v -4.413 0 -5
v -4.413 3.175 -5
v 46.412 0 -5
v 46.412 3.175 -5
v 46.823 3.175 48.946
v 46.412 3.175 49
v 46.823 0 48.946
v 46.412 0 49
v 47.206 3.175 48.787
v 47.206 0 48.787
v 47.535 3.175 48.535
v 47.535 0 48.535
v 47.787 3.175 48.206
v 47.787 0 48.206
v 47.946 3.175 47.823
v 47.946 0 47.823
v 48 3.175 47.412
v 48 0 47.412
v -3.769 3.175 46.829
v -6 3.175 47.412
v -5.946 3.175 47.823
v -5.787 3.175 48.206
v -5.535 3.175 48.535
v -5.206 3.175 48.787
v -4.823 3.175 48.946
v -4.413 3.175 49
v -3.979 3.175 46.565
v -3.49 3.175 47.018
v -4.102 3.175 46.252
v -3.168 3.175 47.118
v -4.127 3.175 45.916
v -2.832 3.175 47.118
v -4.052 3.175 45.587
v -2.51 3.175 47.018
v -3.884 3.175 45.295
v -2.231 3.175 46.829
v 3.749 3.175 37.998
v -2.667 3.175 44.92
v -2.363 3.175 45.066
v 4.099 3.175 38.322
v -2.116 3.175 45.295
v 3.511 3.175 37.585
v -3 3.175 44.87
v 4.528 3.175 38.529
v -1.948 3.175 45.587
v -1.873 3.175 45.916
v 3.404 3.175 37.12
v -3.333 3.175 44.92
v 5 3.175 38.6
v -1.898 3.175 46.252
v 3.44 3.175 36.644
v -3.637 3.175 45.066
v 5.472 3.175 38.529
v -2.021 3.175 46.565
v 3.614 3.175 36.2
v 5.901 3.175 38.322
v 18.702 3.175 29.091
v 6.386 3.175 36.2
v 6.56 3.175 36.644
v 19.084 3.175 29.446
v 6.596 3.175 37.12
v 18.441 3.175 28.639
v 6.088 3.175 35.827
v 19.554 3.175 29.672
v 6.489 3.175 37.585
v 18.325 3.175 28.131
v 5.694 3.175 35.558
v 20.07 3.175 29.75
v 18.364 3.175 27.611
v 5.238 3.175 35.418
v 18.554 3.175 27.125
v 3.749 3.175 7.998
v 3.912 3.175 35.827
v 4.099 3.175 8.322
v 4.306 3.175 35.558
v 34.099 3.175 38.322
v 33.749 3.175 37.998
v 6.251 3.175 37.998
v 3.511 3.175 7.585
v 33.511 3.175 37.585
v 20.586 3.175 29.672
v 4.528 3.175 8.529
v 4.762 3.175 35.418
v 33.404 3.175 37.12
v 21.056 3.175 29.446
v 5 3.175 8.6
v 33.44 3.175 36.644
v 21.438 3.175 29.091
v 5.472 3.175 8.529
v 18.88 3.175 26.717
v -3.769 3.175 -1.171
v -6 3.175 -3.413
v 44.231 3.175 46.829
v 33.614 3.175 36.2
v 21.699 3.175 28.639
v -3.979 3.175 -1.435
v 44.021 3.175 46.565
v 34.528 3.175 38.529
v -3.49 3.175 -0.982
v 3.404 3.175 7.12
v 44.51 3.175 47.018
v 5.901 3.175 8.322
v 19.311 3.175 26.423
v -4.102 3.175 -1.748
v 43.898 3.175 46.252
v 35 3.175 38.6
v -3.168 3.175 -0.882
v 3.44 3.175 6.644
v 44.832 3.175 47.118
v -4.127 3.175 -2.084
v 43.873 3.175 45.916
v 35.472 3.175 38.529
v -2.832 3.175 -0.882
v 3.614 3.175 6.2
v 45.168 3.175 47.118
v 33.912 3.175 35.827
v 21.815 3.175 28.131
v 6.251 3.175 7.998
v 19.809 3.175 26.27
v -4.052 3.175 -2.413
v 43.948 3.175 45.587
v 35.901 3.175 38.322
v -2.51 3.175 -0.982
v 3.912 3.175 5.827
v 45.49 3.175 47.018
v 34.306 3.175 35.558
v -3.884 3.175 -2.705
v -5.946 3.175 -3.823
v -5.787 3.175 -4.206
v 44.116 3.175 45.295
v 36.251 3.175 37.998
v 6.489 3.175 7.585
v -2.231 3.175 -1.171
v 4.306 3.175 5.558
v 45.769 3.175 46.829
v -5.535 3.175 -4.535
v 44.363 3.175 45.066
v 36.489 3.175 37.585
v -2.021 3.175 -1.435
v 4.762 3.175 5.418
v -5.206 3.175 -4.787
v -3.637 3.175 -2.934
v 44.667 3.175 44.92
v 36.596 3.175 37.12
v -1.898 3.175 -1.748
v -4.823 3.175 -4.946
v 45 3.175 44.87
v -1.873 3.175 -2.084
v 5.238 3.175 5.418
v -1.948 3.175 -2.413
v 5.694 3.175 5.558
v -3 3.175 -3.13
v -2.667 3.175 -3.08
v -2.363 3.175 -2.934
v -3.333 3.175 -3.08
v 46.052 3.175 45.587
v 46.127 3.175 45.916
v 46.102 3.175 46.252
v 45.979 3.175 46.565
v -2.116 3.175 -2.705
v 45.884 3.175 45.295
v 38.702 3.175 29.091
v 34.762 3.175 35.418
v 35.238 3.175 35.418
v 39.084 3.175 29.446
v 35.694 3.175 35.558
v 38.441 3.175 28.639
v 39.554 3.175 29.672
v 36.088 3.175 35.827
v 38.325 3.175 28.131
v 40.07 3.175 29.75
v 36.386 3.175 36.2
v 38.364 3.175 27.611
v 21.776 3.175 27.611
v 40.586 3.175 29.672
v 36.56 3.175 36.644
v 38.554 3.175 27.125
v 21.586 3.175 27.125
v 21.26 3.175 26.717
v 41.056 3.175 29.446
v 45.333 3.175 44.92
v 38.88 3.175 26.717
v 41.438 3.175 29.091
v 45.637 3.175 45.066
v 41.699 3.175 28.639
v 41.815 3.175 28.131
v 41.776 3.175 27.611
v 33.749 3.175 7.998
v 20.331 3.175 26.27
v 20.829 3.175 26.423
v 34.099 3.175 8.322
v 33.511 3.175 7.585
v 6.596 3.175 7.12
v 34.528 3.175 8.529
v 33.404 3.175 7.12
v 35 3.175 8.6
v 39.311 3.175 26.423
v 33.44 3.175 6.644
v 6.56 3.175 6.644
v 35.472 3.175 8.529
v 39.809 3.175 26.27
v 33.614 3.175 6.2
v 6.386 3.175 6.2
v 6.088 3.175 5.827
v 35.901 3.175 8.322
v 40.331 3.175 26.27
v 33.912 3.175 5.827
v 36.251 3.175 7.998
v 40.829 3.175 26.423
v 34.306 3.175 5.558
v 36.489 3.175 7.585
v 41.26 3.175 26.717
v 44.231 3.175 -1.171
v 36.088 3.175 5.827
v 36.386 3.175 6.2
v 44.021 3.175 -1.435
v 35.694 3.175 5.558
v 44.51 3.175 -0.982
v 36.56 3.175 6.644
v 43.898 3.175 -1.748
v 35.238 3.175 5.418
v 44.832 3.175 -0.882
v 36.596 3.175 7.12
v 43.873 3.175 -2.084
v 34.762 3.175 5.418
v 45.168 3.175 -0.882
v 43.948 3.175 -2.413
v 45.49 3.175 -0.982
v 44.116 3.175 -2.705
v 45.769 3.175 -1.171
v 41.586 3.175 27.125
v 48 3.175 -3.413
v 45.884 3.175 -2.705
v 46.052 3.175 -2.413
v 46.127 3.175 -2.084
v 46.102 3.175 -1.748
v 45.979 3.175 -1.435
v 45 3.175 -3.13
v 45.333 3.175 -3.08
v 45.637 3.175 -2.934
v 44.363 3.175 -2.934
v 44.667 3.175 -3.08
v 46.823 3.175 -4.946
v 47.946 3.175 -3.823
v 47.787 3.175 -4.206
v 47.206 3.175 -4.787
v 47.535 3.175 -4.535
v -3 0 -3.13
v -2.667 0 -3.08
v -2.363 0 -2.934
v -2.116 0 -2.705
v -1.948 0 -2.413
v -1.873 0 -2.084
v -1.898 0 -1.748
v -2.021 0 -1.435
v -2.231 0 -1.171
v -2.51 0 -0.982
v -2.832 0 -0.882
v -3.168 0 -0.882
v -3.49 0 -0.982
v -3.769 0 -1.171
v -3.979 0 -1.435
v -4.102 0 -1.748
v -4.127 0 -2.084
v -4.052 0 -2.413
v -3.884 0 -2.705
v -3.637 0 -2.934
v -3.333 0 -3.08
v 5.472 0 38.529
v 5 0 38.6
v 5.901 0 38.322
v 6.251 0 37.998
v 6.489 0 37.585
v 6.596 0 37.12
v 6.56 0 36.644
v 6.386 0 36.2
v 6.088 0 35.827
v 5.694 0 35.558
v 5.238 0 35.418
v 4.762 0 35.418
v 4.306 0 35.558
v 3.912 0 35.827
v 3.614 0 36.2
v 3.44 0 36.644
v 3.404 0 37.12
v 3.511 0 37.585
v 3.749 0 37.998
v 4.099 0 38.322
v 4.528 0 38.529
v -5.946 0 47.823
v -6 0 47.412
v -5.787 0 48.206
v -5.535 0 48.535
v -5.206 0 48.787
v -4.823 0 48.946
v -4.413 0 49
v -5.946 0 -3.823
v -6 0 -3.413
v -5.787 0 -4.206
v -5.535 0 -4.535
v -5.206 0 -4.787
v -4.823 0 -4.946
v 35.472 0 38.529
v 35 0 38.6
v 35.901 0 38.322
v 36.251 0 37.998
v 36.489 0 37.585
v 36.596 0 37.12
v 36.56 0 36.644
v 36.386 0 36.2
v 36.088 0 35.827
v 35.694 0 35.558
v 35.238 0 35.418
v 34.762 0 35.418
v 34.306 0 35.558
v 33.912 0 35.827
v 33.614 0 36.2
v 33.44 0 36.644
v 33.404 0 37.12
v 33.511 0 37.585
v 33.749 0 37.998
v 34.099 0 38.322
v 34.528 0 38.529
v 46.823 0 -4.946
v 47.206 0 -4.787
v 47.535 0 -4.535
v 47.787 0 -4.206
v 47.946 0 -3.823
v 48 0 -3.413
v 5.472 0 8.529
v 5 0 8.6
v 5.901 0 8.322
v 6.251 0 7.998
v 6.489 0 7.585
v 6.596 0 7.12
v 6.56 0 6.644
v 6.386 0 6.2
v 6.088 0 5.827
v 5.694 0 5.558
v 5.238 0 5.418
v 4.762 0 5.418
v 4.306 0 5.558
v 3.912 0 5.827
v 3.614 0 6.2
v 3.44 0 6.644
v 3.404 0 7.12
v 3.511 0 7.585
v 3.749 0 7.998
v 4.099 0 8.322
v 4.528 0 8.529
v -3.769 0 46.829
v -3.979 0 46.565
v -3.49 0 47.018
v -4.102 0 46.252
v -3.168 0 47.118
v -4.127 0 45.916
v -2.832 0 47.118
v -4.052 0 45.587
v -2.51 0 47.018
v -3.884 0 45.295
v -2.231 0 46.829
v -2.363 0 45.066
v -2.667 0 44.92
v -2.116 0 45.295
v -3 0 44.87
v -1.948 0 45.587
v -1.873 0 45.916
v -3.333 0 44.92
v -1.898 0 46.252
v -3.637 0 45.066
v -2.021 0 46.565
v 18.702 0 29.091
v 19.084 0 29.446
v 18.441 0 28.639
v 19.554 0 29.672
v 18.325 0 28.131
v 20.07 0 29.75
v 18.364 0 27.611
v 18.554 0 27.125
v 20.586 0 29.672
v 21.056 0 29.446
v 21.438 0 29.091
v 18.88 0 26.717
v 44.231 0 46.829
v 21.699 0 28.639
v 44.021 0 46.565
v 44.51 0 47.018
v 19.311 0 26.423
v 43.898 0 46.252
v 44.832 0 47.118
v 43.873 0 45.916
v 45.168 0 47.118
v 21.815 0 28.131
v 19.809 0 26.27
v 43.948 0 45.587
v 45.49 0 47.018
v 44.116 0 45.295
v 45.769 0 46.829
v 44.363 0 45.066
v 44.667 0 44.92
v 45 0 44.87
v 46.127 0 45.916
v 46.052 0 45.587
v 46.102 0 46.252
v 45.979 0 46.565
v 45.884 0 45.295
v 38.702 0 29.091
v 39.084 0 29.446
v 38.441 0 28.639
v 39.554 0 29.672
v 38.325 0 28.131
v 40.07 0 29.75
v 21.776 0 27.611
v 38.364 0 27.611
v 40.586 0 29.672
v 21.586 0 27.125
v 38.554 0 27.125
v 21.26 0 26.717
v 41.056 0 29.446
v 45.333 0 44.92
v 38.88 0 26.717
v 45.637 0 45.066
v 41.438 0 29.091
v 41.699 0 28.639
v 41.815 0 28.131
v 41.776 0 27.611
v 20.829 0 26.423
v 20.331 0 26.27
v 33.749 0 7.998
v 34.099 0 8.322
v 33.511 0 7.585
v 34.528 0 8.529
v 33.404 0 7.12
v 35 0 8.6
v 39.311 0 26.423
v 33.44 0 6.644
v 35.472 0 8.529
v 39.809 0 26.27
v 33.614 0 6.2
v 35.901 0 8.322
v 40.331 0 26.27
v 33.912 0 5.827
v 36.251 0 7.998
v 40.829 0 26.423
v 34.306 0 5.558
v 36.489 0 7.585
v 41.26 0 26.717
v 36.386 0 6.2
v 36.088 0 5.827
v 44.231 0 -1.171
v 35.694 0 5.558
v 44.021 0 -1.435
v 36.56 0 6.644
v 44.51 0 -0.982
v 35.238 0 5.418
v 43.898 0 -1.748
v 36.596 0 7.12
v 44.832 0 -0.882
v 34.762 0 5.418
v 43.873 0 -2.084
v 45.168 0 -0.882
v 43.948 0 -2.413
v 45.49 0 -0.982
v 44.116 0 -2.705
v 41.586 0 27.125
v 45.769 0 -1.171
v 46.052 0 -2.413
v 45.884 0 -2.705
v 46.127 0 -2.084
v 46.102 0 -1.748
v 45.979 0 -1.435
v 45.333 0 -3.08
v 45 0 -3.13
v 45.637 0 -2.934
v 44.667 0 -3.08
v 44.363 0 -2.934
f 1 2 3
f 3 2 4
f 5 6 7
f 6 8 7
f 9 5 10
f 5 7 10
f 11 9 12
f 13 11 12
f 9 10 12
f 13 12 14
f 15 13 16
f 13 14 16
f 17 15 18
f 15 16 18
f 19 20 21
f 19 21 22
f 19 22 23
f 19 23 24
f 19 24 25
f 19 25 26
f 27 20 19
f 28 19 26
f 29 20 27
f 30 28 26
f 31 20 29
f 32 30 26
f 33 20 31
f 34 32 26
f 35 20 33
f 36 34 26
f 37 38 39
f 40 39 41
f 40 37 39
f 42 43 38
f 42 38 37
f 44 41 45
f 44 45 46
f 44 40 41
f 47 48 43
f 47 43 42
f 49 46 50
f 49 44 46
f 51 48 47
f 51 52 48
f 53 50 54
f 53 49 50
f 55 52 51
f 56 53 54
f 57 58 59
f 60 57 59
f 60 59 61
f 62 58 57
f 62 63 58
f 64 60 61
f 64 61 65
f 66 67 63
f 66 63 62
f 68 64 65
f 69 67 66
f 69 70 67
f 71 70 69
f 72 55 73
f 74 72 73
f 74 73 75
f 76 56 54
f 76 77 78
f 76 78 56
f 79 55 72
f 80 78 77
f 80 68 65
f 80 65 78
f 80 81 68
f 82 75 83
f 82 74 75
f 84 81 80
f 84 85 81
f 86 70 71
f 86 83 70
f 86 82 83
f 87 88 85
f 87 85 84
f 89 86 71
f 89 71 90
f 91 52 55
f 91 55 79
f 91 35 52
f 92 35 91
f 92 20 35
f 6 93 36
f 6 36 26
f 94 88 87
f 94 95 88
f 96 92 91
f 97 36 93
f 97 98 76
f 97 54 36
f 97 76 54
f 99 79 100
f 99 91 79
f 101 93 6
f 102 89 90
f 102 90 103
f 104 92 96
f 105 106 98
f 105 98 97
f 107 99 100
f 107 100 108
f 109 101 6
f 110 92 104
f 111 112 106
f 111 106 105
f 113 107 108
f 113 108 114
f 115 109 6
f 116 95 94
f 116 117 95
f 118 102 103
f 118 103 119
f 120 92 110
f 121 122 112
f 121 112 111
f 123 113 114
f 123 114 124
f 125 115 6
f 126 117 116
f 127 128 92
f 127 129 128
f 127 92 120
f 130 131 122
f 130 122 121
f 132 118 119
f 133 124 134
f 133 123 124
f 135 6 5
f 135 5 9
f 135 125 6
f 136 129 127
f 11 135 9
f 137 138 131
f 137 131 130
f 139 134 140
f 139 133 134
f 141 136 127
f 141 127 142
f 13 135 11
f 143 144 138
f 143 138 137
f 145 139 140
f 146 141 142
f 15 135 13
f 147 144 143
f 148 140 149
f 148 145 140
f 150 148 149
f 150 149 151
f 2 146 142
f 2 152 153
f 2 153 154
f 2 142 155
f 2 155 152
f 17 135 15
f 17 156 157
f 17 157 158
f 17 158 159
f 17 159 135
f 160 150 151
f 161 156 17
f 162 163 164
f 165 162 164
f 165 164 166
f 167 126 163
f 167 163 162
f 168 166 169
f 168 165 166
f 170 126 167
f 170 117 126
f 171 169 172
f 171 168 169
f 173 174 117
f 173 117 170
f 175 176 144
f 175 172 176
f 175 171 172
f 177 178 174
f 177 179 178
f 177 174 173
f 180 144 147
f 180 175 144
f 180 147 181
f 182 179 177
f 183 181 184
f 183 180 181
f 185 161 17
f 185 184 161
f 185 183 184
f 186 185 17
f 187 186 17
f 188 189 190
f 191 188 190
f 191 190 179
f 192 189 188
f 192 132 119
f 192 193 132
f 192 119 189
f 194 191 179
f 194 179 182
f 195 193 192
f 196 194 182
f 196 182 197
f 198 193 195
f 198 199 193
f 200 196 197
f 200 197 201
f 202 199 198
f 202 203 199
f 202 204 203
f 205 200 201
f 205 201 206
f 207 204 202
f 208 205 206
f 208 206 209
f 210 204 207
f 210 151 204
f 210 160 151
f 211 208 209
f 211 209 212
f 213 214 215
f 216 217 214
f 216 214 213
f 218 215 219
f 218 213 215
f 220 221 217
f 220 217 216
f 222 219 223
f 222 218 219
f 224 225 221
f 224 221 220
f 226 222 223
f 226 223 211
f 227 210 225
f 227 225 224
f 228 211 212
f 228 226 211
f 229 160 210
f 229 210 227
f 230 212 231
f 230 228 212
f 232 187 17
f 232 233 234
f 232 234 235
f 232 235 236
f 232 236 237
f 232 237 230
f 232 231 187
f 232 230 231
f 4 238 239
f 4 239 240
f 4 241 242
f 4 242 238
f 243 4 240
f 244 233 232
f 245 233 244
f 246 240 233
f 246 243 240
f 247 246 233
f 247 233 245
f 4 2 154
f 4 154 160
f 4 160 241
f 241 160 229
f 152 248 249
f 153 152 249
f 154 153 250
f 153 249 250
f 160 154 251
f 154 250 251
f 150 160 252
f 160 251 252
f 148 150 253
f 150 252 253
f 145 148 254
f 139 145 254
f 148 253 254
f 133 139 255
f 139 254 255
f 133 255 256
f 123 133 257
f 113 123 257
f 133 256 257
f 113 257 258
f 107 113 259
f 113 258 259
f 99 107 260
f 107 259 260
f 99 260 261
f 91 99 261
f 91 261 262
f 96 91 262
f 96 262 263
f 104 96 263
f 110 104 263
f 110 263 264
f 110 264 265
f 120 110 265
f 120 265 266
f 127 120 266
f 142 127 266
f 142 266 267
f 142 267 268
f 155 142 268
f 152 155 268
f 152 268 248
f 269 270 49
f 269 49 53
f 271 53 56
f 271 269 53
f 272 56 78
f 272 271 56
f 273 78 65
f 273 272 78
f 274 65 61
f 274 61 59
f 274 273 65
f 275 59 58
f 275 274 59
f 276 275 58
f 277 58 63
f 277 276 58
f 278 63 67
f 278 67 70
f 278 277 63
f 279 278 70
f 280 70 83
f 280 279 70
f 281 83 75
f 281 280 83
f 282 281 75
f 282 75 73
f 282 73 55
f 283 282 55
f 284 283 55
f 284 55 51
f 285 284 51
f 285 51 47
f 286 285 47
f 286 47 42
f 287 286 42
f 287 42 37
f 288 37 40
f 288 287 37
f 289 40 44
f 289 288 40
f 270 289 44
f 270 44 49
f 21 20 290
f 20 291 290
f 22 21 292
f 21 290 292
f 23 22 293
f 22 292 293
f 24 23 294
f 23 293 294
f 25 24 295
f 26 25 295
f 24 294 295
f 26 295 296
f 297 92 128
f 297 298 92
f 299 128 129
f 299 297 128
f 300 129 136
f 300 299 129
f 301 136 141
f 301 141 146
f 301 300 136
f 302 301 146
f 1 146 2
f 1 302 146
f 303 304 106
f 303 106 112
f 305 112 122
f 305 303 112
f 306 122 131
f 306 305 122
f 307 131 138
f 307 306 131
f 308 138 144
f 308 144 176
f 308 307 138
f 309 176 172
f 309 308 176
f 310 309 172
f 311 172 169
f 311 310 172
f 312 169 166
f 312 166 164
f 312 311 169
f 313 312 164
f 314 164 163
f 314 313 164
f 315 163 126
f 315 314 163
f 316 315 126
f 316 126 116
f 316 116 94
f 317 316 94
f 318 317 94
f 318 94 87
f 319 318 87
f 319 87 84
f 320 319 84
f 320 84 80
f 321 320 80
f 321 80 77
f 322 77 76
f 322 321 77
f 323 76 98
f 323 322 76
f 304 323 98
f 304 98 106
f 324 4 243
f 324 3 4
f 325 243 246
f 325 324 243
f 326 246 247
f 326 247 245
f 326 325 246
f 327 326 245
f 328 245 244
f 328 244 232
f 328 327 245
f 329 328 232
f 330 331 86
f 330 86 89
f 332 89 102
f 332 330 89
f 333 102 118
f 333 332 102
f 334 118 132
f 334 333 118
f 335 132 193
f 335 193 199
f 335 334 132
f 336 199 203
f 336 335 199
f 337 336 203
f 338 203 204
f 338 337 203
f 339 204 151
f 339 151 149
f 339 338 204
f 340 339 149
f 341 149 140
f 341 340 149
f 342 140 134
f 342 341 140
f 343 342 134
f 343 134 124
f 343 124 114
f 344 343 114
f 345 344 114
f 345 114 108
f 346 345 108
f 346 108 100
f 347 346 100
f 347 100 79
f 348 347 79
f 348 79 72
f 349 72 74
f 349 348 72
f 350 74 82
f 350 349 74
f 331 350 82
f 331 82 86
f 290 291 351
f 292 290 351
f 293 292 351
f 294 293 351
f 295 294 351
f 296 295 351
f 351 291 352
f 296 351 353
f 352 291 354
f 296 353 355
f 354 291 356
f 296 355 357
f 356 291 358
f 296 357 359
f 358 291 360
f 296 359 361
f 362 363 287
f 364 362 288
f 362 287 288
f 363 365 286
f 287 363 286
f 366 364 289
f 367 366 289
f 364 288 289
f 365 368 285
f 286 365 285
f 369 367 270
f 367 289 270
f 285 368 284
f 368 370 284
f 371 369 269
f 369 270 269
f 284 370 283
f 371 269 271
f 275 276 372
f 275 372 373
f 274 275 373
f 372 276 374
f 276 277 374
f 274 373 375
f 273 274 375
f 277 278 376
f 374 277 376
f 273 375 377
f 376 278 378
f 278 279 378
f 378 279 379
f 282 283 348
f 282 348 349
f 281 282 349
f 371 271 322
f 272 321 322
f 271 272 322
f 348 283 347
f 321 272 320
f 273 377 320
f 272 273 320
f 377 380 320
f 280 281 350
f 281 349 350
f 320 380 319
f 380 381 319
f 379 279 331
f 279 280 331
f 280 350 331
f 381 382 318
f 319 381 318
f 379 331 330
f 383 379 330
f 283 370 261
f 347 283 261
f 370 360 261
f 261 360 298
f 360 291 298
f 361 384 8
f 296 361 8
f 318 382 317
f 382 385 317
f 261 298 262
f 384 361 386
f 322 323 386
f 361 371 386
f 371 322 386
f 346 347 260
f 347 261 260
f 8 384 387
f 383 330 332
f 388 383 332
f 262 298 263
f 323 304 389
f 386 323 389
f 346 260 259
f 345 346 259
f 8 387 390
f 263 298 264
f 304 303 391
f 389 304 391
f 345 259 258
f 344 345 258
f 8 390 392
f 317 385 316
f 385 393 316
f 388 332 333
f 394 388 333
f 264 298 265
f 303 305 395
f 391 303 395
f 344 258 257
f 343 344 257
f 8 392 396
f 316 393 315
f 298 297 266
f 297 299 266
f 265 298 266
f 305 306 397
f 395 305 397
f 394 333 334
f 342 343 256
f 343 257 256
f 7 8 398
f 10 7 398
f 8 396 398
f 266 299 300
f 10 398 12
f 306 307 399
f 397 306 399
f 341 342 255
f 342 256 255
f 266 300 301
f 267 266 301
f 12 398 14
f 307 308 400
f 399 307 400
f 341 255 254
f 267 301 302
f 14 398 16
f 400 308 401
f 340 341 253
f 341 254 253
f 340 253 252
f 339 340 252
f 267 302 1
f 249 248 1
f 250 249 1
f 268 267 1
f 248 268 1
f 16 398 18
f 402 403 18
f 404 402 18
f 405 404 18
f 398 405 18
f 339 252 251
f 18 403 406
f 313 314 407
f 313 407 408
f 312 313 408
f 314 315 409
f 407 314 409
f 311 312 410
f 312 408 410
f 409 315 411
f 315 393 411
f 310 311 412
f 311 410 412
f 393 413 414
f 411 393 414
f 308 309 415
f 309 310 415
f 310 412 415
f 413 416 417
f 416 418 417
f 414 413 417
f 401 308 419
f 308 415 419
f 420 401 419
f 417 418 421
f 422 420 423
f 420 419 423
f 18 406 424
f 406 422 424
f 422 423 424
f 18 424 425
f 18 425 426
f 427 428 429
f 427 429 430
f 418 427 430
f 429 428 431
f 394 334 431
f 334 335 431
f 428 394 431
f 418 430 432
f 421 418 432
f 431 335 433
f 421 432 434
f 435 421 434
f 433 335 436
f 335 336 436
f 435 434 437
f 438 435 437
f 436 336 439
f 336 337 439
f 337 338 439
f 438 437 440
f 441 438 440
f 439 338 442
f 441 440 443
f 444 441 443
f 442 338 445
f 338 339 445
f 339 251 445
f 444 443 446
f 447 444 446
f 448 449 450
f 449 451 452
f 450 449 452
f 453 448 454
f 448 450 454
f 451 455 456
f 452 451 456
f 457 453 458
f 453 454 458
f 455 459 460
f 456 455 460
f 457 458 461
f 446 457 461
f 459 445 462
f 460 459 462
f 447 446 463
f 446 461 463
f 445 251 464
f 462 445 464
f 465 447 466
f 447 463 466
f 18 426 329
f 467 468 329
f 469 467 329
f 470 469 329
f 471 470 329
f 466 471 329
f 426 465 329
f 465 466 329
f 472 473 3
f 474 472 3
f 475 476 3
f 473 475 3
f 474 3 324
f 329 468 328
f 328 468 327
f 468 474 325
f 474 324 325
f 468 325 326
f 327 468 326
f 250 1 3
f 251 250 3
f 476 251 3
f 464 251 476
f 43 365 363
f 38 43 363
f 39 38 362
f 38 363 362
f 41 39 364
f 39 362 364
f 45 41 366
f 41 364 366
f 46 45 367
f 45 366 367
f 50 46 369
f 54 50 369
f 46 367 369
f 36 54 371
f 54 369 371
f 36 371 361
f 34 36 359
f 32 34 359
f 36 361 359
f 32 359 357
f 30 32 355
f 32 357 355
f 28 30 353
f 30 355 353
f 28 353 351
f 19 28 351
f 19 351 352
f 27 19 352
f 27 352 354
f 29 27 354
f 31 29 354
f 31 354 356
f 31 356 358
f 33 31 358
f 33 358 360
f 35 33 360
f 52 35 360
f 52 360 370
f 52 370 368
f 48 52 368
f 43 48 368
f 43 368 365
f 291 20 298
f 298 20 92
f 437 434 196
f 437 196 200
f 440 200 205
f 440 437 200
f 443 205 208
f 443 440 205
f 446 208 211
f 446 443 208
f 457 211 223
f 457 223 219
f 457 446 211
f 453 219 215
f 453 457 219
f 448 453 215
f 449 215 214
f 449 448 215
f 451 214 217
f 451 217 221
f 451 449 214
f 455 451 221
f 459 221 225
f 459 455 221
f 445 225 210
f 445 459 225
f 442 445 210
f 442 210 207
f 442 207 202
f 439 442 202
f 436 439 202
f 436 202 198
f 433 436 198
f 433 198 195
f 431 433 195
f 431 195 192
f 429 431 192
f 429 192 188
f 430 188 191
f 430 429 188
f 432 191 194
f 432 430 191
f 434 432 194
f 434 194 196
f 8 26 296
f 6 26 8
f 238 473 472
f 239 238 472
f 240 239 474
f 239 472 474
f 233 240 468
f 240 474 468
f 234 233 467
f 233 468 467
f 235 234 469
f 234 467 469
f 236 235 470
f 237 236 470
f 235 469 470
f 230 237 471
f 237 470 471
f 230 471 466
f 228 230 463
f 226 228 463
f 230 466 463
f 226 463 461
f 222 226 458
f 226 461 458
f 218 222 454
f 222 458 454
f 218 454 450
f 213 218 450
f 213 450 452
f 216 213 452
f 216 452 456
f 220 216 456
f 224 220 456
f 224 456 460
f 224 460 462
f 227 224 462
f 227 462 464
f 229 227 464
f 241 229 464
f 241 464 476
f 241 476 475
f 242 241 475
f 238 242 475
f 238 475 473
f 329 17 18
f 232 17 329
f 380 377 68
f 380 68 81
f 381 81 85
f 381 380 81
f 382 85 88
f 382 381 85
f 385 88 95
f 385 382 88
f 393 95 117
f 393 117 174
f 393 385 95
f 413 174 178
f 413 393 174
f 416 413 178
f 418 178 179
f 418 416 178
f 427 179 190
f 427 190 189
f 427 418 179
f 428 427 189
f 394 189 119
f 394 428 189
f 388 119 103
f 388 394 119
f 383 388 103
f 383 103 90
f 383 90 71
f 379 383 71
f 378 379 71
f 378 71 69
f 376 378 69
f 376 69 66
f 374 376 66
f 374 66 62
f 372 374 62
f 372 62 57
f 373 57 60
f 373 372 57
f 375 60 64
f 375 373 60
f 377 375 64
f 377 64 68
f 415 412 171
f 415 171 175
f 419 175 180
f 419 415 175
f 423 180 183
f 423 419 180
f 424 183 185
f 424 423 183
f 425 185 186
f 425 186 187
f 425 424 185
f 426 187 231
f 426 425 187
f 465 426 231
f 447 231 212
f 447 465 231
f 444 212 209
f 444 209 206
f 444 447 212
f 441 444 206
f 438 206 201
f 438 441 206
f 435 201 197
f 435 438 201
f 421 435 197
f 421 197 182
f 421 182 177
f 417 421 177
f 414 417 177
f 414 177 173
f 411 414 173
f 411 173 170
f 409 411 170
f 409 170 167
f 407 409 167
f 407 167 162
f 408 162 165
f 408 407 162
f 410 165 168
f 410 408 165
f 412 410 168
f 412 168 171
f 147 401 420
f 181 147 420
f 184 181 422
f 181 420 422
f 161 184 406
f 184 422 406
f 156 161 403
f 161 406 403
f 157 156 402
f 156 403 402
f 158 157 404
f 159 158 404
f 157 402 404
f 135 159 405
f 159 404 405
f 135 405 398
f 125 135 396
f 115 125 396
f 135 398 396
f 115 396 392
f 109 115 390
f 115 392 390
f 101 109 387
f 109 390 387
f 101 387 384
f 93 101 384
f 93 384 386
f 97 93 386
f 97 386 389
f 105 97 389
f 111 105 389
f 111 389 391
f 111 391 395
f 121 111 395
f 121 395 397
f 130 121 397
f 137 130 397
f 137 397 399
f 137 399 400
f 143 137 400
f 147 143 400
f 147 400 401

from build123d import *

# Parameters (mm, degrees)
SKETCH1_W             = 42
SKETCH1_H             = 54
SKETCH1_R             = 1.6
SKETCH1_R_2           = 1.75
BOSS_EXTRUDE1_DEPTH   = 3.175
SKETCH2_W             = 6
SKETCH2_H             = 54
BOSS_EXTRUDE2_DEPTH   = 3.175
F_4_40_TAPPED_HOLE1_D = 2.2606
FILLET1_R             = 1.5875


with BuildPart() as part:
    # Sketch1 → Boss-Extrude1 (new body)
    with BuildSketch(Plane(origin=(0, 0, 0), x_dir=(1, 0, 0), z_dir=(0, 1, 0))):
        with Locations((21, -22)):
            Rectangle(SKETCH1_W, SKETCH1_H)
        with Locations(Location((35, -7, 0), (0, 0, 270))):
            Circle(SKETCH1_R, mode=Mode.SUBTRACT)
        with Locations(Location((5, -37, 0), (0, 0, 270))):
            Circle(SKETCH1_R, mode=Mode.SUBTRACT)
        with Locations(Location((20.07, -28, 0), (0, 0, 270))):
            Circle(SKETCH1_R_2, mode=Mode.SUBTRACT)
        with Locations(Location((35, -37, 0), (0, 0, 270))):
            Circle(SKETCH1_R, mode=Mode.SUBTRACT)
        with Locations(Location((40.07, -28, 0), (0, 0, 270))):
            Circle(SKETCH1_R_2, mode=Mode.SUBTRACT)
        with Locations(Location((5, -7, 0), (0, 0, 270))):
            Circle(SKETCH1_R, mode=Mode.SUBTRACT)
    extrude(amount=BOSS_EXTRUDE1_DEPTH)

    # Sketch2 → Boss-Extrude2 (add)
    with BuildSketch(Plane(origin=(0, 3.175, 0), x_dir=(1, 0, 0), z_dir=(0, 1, 0))):
        with Locations((-3, -22)):
            Rectangle(SKETCH2_W, SKETCH2_H)
        with Locations((45, -22)):
            Rectangle(SKETCH2_W, SKETCH2_H)
    extrude(amount=-BOSS_EXTRUDE2_DEPTH)

    # #4-40 Tapped Hole1 (through all)
    with Locations(Plane(origin=(-3, 3.175, -2), x_dir=(0, 0, 1), z_dir=(0, 1, 0))):
        with Locations((0, 0), (48, 0), (0, 48), (48, 48)):
            Hole(F_4_40_TAPPED_HOLE1_D / 2)

    # Fillet1
    fillet1_edges = [part.edges().sort_by_distance(p)[0] for p in [
        (-6, 1.5875, -5),
        (-6, 1.5875, 49),
        (48, 1.5875, 49),
        (48, 1.5875, -5),
    ]]
    fillet(fillet1_edges, radius=FILLET1_R)


solid = part.part
